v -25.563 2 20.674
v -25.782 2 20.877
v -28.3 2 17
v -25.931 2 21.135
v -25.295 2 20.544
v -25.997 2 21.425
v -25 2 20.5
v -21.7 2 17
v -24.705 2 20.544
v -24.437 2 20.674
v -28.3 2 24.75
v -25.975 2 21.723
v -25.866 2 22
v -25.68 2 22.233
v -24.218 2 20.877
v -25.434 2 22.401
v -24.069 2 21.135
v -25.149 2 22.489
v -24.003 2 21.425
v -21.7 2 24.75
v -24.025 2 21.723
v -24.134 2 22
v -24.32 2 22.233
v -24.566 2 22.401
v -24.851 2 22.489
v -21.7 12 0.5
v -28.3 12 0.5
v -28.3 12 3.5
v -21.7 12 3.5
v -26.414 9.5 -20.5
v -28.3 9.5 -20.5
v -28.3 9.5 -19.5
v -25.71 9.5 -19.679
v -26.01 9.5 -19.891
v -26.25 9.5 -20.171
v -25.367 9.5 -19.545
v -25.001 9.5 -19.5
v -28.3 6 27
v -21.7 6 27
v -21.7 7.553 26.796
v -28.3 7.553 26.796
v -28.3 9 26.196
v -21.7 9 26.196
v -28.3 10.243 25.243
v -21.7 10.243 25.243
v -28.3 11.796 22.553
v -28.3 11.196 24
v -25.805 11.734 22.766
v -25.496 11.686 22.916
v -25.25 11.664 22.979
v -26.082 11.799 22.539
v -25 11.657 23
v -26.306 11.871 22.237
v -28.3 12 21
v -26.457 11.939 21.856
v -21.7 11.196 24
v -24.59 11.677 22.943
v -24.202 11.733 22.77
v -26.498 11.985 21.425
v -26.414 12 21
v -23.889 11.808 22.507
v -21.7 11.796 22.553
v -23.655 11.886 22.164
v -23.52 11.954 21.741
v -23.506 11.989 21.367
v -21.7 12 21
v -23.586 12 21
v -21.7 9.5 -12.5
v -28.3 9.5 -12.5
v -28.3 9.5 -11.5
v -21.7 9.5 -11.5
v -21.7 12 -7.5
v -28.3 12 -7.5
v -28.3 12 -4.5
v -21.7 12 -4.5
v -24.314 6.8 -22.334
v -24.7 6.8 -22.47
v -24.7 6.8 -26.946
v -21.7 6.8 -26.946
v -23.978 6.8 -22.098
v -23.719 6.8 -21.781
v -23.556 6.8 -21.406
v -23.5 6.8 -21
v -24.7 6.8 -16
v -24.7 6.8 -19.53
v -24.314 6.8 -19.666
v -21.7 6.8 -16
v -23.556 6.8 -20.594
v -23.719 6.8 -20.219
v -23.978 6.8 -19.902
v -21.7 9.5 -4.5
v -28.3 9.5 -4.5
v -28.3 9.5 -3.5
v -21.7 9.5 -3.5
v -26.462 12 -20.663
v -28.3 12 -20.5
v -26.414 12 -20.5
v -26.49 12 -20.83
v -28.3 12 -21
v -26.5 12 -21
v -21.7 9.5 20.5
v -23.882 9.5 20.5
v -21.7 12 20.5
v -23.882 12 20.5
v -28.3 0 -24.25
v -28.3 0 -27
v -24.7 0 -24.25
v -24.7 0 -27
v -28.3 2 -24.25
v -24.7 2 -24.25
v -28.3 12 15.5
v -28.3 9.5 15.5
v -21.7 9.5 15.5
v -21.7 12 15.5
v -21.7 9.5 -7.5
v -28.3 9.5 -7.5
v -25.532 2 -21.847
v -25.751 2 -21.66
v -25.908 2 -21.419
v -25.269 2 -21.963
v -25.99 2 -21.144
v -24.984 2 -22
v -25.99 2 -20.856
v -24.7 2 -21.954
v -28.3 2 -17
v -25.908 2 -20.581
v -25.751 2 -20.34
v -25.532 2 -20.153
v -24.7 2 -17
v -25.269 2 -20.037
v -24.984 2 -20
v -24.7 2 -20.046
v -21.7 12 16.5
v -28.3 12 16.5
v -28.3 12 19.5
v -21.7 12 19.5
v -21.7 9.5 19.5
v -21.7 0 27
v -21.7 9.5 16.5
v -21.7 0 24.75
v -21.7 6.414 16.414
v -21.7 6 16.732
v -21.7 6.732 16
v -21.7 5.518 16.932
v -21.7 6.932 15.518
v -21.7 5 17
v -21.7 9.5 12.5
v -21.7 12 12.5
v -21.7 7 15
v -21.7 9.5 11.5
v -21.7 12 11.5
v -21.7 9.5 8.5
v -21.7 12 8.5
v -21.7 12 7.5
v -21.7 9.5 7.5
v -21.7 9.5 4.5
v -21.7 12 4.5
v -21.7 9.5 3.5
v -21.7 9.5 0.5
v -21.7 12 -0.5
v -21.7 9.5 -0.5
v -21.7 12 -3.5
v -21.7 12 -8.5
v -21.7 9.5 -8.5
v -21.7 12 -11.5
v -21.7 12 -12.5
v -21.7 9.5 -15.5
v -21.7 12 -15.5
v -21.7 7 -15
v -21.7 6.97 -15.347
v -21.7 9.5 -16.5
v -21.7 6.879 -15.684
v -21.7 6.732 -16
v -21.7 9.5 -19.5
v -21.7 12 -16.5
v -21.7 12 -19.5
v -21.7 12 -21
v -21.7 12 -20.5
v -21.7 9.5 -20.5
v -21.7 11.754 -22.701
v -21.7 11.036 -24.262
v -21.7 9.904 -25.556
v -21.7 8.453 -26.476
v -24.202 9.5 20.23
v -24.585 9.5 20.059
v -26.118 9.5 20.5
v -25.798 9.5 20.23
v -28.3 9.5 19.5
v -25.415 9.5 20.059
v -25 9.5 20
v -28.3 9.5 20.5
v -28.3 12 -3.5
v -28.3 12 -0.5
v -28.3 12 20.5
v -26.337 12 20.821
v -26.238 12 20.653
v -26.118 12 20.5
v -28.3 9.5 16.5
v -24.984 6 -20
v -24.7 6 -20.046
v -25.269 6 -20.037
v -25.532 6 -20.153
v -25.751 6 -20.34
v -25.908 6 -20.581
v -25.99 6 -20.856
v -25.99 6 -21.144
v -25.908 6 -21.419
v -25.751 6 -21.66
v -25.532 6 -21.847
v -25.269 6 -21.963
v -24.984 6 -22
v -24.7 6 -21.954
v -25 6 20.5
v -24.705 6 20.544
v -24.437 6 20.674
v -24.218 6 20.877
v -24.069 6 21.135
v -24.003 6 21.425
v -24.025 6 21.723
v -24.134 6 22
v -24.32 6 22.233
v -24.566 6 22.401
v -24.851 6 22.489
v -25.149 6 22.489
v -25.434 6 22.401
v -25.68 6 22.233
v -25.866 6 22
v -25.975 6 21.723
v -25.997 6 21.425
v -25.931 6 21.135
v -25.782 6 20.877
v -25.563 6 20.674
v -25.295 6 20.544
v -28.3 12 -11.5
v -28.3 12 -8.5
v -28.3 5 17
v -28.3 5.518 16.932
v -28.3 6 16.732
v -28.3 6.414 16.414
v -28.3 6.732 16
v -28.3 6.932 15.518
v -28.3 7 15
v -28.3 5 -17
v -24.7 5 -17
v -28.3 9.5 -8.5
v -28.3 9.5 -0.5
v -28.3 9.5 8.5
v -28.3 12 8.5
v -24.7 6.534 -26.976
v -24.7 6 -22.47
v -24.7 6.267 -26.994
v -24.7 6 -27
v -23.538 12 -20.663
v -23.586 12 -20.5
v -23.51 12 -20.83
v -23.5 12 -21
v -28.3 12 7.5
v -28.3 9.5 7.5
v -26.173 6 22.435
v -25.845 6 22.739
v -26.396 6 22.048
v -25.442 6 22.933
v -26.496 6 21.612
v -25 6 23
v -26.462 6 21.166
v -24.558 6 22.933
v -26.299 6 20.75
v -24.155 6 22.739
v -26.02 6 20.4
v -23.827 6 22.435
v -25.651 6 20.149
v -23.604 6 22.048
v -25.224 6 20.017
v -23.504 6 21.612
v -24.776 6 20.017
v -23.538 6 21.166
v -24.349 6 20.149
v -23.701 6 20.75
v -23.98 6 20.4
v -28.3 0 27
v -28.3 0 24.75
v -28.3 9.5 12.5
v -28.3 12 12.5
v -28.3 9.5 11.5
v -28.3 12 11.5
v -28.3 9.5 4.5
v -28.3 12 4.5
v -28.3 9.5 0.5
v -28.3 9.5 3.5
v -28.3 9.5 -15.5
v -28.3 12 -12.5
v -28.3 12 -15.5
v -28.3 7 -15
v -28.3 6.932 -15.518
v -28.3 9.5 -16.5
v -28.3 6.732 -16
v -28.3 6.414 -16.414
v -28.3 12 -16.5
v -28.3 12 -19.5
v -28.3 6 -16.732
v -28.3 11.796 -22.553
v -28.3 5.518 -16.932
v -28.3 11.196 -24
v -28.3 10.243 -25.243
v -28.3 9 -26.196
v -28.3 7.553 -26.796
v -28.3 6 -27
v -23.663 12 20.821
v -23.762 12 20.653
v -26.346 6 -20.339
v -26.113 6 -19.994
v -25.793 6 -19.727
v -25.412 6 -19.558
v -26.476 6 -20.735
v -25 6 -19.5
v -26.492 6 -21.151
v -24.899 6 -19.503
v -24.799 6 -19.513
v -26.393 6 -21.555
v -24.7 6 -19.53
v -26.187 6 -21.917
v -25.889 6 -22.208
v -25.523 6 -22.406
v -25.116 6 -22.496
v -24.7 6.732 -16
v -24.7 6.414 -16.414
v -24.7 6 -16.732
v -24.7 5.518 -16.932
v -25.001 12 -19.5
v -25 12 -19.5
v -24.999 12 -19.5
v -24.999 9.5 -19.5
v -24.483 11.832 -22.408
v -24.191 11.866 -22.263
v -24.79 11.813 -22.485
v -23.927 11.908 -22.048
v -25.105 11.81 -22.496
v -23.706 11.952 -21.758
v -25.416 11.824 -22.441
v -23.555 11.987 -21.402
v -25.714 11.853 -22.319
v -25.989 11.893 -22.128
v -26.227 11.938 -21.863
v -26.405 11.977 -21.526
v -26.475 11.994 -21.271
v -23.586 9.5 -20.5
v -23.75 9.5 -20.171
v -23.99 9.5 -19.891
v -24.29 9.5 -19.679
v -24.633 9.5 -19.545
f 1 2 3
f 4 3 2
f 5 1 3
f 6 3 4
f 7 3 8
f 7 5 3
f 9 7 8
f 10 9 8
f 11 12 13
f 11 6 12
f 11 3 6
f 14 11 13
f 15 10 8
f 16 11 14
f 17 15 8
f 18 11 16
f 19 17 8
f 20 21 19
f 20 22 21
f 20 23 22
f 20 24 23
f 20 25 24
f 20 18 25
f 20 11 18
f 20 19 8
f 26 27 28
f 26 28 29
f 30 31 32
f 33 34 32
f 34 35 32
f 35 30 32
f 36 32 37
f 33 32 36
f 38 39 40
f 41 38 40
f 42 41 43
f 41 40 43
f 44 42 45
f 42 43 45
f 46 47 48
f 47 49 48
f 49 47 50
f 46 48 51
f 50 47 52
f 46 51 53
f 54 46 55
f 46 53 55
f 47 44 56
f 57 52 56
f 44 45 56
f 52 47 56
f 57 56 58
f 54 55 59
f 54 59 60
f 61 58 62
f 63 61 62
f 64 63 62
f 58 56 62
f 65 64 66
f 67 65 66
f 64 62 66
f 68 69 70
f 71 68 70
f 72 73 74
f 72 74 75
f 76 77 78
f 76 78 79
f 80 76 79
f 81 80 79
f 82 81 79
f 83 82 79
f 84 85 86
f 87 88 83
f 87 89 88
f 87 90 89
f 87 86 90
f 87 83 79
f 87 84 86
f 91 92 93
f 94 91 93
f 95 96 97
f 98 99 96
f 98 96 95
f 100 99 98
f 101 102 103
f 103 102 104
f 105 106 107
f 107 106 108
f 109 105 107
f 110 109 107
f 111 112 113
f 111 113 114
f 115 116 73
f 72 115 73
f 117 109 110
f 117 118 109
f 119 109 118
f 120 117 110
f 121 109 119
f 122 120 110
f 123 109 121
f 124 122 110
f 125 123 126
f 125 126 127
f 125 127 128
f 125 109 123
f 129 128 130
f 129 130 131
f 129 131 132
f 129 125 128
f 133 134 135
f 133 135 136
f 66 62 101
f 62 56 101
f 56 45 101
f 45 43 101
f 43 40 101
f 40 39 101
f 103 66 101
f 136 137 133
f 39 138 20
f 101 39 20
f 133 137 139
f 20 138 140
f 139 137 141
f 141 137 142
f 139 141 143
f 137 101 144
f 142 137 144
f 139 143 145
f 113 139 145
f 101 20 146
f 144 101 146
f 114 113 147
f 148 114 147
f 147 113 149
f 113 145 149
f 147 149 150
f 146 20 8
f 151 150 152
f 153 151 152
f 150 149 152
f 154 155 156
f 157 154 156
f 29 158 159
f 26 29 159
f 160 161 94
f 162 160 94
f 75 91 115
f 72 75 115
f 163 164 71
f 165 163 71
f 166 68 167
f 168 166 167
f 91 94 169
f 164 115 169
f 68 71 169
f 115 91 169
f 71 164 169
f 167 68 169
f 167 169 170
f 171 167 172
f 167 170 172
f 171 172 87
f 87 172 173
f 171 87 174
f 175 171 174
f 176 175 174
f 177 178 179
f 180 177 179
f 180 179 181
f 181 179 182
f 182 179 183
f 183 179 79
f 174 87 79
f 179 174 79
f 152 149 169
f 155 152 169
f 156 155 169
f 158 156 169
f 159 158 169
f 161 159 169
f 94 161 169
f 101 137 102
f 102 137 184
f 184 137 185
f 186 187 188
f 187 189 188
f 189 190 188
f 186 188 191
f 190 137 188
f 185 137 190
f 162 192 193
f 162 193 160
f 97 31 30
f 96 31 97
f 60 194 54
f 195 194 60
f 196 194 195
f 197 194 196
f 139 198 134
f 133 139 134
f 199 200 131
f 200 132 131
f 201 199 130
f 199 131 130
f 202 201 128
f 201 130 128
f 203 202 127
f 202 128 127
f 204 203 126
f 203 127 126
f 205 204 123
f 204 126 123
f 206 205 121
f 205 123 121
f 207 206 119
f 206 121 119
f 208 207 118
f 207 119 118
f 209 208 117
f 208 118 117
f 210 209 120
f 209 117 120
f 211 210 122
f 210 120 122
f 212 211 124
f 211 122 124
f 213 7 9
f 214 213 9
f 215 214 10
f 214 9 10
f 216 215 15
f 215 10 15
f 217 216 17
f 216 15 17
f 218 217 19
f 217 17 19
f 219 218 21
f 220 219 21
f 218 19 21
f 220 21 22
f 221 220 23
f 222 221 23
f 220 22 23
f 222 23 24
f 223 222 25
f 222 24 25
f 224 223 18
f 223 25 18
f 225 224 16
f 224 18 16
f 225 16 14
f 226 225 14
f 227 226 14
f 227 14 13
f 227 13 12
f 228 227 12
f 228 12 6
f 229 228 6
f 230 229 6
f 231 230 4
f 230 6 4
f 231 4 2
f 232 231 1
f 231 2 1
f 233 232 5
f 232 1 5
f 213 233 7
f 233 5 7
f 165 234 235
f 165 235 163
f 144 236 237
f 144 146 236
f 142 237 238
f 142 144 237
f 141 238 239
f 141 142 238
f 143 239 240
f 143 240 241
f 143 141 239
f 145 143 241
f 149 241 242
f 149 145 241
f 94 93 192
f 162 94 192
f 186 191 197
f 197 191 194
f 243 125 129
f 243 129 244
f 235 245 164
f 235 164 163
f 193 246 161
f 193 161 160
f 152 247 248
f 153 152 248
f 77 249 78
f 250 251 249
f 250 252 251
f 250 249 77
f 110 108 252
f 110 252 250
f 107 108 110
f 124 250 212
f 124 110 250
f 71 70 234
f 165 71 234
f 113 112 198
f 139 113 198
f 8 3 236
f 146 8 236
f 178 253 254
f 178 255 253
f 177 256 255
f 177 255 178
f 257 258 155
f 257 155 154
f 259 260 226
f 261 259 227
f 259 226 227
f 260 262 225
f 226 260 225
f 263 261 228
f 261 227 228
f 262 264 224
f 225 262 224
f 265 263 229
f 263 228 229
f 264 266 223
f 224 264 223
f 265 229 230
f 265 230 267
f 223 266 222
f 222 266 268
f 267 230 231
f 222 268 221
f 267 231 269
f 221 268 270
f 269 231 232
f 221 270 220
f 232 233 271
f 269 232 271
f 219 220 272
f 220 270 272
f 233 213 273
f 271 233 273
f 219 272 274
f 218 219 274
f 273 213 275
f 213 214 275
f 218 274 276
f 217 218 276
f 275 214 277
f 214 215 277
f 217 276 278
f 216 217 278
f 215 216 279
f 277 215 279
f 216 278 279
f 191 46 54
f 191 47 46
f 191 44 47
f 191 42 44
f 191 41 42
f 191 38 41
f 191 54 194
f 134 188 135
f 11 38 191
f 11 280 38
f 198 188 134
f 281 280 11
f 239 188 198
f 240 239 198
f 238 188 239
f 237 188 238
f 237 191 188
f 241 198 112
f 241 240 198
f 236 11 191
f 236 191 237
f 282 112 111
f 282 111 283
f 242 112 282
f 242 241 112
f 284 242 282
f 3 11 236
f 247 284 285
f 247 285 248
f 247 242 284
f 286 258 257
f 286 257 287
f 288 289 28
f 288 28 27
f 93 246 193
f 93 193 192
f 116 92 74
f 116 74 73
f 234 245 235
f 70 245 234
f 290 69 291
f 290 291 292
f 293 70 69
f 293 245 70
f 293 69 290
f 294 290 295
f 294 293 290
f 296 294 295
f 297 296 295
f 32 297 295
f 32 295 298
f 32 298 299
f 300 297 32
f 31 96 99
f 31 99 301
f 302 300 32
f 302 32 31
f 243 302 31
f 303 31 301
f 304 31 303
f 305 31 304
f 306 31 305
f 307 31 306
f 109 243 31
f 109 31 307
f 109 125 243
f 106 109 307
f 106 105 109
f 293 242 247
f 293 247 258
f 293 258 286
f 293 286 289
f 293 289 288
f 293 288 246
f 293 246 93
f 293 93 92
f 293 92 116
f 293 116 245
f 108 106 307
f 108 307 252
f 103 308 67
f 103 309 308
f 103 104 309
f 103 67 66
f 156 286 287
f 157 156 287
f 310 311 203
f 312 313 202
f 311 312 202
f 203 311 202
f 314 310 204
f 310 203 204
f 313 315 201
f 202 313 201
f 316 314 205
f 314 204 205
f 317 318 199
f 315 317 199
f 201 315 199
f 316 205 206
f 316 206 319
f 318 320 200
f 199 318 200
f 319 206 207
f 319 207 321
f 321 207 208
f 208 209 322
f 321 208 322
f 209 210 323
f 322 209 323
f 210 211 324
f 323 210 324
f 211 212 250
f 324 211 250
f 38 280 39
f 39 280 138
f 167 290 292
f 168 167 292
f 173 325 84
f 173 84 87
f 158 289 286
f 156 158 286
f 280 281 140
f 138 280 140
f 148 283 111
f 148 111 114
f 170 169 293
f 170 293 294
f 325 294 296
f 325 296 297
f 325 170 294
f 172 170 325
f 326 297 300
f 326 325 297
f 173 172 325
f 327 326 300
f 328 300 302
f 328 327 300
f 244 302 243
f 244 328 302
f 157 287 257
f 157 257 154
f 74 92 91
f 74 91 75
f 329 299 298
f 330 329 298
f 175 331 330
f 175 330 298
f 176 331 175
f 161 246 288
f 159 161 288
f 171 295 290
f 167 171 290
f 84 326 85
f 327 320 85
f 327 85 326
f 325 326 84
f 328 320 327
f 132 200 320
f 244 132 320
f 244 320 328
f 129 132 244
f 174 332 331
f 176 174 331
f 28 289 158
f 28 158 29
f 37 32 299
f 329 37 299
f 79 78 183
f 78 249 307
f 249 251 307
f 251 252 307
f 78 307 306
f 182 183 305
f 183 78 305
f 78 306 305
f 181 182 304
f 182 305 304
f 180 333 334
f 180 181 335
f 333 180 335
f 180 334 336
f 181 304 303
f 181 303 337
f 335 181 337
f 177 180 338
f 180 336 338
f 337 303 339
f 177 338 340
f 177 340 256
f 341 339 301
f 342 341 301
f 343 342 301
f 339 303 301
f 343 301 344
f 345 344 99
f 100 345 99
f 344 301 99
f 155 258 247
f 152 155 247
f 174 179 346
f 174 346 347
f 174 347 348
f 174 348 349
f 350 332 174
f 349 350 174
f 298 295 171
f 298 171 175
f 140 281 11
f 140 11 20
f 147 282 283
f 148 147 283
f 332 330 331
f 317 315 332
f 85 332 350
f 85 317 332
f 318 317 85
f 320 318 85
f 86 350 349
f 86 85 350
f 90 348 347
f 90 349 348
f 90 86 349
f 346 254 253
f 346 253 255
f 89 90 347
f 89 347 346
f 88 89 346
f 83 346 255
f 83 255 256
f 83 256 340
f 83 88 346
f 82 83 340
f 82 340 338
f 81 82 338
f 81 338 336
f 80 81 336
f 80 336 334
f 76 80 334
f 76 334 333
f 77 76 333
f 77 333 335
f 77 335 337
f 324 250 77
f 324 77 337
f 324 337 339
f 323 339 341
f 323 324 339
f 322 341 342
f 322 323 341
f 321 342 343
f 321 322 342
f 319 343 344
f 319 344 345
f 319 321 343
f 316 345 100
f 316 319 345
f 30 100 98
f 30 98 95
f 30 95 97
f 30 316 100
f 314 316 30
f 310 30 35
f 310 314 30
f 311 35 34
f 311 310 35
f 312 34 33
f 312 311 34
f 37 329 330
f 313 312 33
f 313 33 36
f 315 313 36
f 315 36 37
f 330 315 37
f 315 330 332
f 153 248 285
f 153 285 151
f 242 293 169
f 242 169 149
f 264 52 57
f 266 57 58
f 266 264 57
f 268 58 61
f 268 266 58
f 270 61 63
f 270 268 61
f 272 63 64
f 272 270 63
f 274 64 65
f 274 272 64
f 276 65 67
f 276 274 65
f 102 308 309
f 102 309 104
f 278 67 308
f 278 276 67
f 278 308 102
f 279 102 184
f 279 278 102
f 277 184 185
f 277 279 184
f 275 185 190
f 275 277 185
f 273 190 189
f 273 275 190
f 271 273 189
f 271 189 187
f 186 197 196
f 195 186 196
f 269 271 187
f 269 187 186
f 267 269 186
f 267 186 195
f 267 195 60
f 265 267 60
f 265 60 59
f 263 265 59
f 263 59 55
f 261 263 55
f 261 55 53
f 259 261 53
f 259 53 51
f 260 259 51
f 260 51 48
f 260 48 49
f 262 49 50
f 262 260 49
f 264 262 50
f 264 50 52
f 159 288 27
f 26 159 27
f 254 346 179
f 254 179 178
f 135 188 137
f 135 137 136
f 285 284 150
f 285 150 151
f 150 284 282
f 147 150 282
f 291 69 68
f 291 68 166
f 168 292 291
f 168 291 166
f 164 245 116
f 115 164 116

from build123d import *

# Parameters (mm, degrees)
SKETCH_1_W          = 6.6
SKETCH_1_H          = 54
SKETCH_1_R          = 1.49999954
EXTRUDE_1_DEPTH     = 12
FILLET_1_R          = 6
SKETCH_2_W          = 34
SKETCH_2_H          = 14
CUT_EXTRUDE_1_DEPTH = 20
FILLET_2_R          = 2
SKETCH_3_W          = 1
SKETCH_3_H          = 2.5
CUT_EXTRUDE_2_DEPTH = 31.274742098
SKETCH_4_W          = 14.557801868
SKETCH_4_H          = 49
CUT_EXTRUDE_3_DEPTH = 2
SKETCH_6_R          = 1.5
SKETCH_6_R_2        = 1
SKETCH_6_R_3        = 1.49999954
EXTRUDE_2_DEPTH     = 4
SKETCH_7_W          = 6
SKETCH_7_H          = 22
CUT_EXTRUDE_4_DEPTH = 6.8


with BuildPart() as part:
    # 草图1 → 凸台-拉伸1 (new body)
    with BuildSketch(Plane(origin=(0, 0, 0), x_dir=(1, 0, 0), z_dir=(0, 1, 0))):
        with Locations((-25, 0)):
            Rectangle(SKETCH_1_W, SKETCH_1_H)
        with Locations(Location((-25, -21.49999992, 0), (0, 0, 270))):
            Circle(SKETCH_1_R, mode=Mode.SUBTRACT)
        with Locations(Location((-25, 20.9999989, 0), (0, 0, 270))):
            Circle(SKETCH_1_R, mode=Mode.SUBTRACT)
    extrude(amount=EXTRUDE_1_DEPTH)

    # 圆角1
    # the kernel refuses this fillet: 6 mm, written as the material it takes off along each edge
    with BuildSketch(Plane(origin=(-6.7, 12, 27), x_dir=(0, -1, 0), z_dir=(-1, 0, 0)), Plane(origin=(-43.3, 12, -27), x_dir=(0, -1, 0), z_dir=(1, 0, 0))) as fillet_1_piece_1:
        with BuildLine():
            CenterArc((FILLET_1_R, -FILLET_1_R), FILLET_1_R, 90, 90)
            Line((0, -FILLET_1_R), (0, 0))
            Line((0, 0), (FILLET_1_R, 0))
        make_face()
    extrude(amount=36.6, mode=Mode.SUBTRACT)

    # 草图2 → 切除-拉伸1 (cut)
    with BuildSketch(Plane.ZY.offset(28.3)):
        Rectangle(SKETCH_2_W, SKETCH_2_H)
    extrude(amount=-CUT_EXTRUDE_1_DEPTH, mode=Mode.SUBTRACT)

    # 圆角2
    fillet_2_edges = [part.edges().sort_by_distance(p)[0] for p in [
        (-25, 7, 17),
        (-25, 7, -17),
    ]]
    fillet(fillet_2_edges, radius=FILLET_2_R)

    # 草图3 → 切除-拉伸2 (cut, through all)
    with BuildSketch(Plane.ZY.offset(28.3)):
        with Locations((0, 10.75)):
            Rectangle(SKETCH_3_W, SKETCH_3_H)
        with Locations((4, 10.75)):
            Rectangle(SKETCH_3_W, SKETCH_3_H)
        with Locations((8, 10.75)):
            Rectangle(SKETCH_3_W, SKETCH_3_H)
        with Locations((12, 10.75)):
            Rectangle(SKETCH_3_W, SKETCH_3_H)
        with Locations((16, 10.75)):
            Rectangle(SKETCH_3_W, SKETCH_3_H)
        with Locations((20, 10.75)):
            Rectangle(SKETCH_3_W, SKETCH_3_H)
        with Locations((-4, 10.75)):
            Rectangle(SKETCH_3_W, SKETCH_3_H)
        with Locations((-8, 10.75)):
            Rectangle(SKETCH_3_W, SKETCH_3_H)
        with Locations((-12, 10.75)):
            Rectangle(SKETCH_3_W, SKETCH_3_H)
        with Locations((-16, 10.75)):
            Rectangle(SKETCH_3_W, SKETCH_3_H)
        with Locations((-20, 10.75)):
            Rectangle(SKETCH_3_W, SKETCH_3_H)
    extrude(amount=-CUT_EXTRUDE_2_DEPTH, mode=Mode.SUBTRACT)

    # 草图4 → 切除-拉伸3 (cut)
    with BuildSketch(Plane.XZ):
        with Locations((-25, 0.25000051)):
            Rectangle(SKETCH_4_W, SKETCH_4_H)
    extrude(amount=-CUT_EXTRUDE_3_DEPTH, mode=Mode.SUBTRACT)

    # 草图6 → 凸台-拉伸2 (add)
    # profile 1 of 2: a face of its own
    with BuildSketch(Plane.XZ.offset(-2)):
        with Locations(Location((-25, 21.49999992, 0), (0, 0, 270))):
            Circle(SKETCH_6_R)
        with Locations(Location((-25, 21.49999992, 0), (0, 0, 270))):
            Circle(SKETCH_6_R_2, mode=Mode.SUBTRACT)
    # profile 2 of 2: a face of its own
    with BuildSketch(Plane.XZ.offset(-2)):
        with Locations(Location((-25, -20.9999989, 0), (0, 0, 270))):
            Circle(SKETCH_6_R_3)
        with Locations(Location((-25, -20.9999989, 0), (0, 0, 270))):
            Circle(SKETCH_6_R_2, mode=Mode.SUBTRACT)
    extrude(amount=-EXTRUDE_2_DEPTH)

    # 草图7 → 切除-拉伸4 (cut)
    with BuildSketch(Plane.XZ):
        with Locations((-21.7, -27)):
            Rectangle(SKETCH_7_W, SKETCH_7_H)
    extrude(amount=-CUT_EXTRUDE_4_DEPTH, mode=Mode.SUBTRACT)


solid = part.part
